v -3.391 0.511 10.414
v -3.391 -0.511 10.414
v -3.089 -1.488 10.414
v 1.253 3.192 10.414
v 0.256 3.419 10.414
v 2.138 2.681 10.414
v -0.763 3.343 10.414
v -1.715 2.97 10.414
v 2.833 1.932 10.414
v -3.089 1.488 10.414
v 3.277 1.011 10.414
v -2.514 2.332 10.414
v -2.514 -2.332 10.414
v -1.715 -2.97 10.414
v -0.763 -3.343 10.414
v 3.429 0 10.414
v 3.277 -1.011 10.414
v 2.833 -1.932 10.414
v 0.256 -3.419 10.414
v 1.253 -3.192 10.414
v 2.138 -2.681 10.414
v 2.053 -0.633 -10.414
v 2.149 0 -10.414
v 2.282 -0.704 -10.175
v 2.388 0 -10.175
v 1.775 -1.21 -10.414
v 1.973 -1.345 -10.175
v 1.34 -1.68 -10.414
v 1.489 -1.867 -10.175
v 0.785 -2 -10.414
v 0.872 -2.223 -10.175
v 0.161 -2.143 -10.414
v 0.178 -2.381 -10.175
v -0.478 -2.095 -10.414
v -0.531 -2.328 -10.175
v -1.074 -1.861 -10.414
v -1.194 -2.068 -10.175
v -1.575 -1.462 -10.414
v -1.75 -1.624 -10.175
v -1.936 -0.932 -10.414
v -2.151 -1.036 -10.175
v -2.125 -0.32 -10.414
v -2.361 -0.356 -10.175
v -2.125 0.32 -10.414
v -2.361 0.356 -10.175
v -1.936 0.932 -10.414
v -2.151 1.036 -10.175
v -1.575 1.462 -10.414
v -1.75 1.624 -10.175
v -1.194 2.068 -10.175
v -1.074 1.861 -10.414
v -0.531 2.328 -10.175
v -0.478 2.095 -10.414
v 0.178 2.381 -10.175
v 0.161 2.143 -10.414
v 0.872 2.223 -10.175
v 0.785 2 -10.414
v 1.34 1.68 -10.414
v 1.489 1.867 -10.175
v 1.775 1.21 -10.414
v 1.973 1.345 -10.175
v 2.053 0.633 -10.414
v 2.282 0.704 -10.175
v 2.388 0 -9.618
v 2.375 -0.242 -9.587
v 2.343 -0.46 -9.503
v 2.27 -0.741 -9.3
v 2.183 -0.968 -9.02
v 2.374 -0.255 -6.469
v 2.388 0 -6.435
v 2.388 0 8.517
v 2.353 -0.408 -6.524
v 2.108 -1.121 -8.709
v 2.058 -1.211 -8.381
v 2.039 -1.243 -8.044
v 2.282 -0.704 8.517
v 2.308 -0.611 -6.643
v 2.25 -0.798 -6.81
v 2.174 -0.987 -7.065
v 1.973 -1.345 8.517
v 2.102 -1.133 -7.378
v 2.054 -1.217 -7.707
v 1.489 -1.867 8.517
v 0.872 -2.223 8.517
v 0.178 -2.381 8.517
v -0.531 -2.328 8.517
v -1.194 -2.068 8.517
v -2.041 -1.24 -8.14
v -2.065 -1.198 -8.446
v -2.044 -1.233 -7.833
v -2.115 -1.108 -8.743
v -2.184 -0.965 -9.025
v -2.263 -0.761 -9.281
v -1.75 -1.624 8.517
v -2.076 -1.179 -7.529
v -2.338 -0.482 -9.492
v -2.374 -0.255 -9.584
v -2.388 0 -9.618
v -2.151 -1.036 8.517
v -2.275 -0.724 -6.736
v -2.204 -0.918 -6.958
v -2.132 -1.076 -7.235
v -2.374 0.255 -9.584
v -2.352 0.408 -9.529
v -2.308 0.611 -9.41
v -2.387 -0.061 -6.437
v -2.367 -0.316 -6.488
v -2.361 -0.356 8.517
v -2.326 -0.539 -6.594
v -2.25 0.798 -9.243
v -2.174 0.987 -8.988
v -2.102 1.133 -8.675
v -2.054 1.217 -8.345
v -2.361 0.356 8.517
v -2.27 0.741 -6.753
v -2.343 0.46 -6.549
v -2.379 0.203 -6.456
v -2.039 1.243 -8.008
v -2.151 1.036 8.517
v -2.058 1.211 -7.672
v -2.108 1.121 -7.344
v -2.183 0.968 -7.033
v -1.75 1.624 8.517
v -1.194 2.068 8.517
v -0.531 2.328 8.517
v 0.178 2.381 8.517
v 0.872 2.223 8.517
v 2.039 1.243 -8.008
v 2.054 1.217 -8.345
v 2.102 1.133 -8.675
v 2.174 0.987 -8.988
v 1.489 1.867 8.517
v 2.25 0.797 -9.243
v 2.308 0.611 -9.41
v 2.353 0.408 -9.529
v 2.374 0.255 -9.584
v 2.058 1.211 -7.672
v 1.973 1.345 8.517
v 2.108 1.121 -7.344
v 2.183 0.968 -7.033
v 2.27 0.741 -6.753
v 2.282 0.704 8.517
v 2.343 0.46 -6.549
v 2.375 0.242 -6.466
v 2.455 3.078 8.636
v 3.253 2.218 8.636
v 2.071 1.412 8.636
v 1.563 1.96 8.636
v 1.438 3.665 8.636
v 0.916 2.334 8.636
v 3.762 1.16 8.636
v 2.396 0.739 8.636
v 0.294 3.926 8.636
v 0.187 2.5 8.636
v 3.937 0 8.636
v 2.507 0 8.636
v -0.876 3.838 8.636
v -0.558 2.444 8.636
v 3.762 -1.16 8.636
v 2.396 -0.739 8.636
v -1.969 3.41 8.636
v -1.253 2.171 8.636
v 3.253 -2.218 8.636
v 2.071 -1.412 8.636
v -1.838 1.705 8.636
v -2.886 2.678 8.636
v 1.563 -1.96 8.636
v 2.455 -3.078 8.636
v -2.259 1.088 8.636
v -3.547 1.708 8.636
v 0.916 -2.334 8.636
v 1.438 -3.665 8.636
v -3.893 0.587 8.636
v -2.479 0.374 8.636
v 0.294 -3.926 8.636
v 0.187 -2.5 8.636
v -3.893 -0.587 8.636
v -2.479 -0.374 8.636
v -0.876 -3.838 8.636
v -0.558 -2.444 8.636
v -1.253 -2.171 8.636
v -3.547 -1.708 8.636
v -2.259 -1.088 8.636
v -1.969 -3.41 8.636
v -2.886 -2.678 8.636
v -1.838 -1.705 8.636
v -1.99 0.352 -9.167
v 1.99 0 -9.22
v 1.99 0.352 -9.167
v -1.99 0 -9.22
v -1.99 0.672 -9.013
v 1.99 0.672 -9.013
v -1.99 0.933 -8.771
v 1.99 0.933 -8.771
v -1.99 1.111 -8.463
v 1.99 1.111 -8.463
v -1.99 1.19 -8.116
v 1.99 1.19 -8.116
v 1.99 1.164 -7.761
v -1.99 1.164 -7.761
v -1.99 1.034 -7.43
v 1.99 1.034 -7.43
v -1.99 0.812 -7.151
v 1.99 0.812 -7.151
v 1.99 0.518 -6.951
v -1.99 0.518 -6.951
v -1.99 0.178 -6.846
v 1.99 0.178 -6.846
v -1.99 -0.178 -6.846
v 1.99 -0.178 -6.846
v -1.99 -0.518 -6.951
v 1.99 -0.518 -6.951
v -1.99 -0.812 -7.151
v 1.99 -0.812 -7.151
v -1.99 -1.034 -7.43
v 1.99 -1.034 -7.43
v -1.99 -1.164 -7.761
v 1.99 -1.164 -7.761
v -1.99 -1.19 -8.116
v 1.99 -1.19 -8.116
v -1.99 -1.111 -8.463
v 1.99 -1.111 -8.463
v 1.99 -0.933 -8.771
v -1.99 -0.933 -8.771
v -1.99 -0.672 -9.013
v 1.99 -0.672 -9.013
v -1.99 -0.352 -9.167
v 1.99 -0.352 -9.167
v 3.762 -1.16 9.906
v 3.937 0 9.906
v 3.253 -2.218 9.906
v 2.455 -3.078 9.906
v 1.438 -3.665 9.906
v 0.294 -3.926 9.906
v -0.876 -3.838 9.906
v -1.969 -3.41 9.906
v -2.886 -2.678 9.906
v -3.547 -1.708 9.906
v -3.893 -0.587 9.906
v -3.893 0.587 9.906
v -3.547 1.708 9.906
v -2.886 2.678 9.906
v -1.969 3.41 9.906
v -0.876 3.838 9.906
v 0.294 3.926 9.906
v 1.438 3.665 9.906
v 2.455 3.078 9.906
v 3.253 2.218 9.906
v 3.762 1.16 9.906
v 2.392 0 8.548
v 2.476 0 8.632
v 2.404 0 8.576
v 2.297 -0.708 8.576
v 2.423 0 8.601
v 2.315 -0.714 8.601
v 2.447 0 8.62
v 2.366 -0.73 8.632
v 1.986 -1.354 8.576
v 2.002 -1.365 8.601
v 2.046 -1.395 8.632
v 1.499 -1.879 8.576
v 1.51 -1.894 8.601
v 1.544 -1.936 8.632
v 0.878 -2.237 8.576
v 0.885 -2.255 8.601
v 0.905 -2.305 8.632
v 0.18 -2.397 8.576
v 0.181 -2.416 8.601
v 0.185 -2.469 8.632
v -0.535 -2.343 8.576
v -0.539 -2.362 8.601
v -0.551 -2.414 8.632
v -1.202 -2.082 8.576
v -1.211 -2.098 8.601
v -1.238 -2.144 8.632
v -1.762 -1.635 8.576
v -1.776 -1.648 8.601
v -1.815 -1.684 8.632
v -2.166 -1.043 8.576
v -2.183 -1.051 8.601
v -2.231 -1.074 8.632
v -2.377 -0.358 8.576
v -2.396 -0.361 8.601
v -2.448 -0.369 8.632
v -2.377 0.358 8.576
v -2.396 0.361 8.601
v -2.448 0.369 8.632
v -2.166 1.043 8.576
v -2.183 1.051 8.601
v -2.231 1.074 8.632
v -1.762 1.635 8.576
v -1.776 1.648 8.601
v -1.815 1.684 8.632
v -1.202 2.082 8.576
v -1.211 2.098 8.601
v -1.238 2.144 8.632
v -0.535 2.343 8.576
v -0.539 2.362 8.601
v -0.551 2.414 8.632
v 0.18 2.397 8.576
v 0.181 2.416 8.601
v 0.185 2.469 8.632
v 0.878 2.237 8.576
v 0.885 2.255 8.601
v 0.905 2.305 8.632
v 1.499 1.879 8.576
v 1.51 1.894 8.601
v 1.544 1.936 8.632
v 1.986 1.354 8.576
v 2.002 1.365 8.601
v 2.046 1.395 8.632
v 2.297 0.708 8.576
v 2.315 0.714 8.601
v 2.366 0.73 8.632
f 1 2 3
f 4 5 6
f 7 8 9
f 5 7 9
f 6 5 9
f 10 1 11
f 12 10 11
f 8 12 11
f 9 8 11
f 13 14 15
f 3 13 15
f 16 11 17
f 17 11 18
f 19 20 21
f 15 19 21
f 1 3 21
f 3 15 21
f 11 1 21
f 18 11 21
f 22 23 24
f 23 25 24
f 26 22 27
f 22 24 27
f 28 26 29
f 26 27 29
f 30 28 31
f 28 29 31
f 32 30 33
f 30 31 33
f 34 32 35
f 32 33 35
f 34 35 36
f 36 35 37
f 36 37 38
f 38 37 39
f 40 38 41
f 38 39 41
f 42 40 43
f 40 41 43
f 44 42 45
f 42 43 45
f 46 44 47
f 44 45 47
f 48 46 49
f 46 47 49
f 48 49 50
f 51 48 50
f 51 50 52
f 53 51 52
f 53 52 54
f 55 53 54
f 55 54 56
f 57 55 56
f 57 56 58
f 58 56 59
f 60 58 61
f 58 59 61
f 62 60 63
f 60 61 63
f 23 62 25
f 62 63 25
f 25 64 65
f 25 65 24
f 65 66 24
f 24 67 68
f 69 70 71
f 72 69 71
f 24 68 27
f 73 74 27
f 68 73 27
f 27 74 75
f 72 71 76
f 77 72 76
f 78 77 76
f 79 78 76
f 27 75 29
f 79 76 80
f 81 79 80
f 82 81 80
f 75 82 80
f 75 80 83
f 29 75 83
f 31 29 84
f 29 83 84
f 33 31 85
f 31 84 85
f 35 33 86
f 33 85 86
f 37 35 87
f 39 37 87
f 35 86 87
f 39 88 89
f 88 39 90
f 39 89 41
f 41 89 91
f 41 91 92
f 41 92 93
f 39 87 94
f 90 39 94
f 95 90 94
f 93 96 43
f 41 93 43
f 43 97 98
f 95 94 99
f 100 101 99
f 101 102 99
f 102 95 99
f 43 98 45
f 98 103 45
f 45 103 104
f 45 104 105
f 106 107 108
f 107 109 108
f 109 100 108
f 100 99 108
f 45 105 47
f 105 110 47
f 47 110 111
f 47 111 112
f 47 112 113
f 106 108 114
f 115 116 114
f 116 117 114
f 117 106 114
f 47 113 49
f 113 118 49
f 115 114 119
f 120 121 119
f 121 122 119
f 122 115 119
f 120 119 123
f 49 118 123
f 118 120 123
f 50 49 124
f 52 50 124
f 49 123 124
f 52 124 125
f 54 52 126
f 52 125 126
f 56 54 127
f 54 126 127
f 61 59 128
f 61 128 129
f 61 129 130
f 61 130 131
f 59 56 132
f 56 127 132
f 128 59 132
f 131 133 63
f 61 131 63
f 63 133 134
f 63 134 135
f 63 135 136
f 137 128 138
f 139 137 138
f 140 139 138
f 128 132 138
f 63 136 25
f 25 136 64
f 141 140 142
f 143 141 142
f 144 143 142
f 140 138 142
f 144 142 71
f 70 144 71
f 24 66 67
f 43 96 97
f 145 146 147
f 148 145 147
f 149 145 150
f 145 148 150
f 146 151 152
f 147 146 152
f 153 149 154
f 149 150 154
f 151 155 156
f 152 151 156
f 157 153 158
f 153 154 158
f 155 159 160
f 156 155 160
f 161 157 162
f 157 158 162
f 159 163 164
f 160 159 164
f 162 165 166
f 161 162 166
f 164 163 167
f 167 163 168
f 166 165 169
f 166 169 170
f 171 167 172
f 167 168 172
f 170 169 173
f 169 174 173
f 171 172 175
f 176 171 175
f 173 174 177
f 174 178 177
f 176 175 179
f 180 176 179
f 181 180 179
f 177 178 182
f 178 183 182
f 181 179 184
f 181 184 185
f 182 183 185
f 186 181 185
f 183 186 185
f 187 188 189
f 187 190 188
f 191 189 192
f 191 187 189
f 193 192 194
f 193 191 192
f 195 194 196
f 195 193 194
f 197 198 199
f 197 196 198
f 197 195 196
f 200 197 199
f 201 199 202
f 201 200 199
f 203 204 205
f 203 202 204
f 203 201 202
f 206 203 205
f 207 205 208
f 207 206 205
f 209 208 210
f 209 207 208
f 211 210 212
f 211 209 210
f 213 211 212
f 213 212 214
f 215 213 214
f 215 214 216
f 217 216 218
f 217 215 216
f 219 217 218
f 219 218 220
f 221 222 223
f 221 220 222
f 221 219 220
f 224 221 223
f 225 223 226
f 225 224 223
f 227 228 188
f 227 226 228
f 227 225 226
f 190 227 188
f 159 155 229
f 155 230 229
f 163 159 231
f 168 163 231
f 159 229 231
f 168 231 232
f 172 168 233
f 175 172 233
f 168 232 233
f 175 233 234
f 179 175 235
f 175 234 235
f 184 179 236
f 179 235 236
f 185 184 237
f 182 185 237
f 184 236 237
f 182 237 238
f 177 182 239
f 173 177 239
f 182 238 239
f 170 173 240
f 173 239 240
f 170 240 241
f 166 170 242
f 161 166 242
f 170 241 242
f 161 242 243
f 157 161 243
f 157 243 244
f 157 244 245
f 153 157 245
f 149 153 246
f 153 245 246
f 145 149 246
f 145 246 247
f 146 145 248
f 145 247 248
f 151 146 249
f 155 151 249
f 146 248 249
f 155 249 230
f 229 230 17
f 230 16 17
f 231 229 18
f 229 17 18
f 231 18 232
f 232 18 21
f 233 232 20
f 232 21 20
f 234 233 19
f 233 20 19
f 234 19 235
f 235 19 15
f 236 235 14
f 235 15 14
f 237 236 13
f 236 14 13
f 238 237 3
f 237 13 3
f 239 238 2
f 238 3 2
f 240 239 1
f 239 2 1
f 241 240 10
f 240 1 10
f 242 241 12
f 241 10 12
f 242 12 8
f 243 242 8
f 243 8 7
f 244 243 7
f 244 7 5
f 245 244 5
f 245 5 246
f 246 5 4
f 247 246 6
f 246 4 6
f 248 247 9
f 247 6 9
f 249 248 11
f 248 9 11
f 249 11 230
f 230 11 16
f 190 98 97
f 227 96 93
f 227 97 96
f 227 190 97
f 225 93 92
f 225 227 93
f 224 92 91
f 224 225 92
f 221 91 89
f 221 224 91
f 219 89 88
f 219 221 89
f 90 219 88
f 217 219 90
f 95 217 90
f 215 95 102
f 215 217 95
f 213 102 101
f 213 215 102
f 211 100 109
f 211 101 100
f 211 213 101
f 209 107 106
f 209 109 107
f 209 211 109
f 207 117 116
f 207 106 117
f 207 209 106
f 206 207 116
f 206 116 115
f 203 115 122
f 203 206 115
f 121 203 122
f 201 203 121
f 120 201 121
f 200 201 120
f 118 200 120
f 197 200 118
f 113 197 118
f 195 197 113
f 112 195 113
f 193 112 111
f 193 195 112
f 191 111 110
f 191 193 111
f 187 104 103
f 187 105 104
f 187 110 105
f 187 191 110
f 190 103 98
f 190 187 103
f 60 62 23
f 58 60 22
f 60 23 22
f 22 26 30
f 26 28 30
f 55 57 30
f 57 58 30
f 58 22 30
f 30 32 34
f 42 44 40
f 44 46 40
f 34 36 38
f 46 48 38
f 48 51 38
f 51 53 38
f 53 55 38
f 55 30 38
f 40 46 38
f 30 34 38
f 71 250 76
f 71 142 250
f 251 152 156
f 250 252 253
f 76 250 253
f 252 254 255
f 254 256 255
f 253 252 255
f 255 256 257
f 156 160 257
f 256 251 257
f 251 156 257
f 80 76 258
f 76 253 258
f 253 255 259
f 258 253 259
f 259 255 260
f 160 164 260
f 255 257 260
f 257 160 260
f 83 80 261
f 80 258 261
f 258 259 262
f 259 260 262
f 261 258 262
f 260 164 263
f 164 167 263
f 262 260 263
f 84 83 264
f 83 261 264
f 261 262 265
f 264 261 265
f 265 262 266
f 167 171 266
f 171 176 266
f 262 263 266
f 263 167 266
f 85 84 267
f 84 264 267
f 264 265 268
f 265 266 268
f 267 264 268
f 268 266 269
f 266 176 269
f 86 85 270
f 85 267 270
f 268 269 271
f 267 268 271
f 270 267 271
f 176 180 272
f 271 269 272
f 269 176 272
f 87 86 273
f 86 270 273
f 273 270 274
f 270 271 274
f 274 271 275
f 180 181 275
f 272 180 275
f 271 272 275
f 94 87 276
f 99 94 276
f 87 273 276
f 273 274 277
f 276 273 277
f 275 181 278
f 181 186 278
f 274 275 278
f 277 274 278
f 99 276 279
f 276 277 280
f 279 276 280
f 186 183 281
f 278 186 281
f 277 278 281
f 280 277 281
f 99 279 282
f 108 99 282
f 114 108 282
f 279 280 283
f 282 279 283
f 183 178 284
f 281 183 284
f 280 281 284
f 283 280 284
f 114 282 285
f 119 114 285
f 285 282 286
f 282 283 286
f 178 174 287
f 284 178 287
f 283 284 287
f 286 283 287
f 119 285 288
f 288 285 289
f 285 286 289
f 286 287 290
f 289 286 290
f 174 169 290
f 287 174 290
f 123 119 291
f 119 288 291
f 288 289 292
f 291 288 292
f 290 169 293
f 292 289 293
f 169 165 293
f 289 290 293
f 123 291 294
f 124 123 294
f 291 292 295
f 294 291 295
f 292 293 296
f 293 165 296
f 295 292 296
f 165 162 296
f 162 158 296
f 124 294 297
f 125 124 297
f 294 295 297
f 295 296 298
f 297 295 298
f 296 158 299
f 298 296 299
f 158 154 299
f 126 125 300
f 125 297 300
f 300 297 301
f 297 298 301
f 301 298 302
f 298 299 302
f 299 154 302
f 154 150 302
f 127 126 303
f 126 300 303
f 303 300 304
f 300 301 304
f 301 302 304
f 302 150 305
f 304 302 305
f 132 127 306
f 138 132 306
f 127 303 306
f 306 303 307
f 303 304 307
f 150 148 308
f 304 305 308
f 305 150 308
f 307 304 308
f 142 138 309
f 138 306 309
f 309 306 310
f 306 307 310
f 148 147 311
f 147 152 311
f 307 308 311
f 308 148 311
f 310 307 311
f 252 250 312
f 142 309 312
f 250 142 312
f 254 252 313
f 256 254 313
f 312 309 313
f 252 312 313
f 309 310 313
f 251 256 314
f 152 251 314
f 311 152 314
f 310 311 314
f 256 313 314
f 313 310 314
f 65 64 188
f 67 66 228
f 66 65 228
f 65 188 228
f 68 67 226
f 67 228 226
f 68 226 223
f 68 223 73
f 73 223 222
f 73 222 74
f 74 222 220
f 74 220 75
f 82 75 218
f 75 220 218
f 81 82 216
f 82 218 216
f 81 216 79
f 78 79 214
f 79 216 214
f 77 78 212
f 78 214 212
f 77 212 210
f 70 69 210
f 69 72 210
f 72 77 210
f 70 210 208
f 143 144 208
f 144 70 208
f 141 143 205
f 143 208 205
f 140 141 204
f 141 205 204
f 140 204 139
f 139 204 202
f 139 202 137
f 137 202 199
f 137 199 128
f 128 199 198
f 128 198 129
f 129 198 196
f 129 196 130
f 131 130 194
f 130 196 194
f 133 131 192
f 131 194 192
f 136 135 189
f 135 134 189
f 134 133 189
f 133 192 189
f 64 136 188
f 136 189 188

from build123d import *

# Parameters (mm, degrees)
CUT_EXTRUDE1_DEPTH      = 12.808951435
CUT_EXTRUDE1_DEPTH_BACK = 12.808951435
SKETCH3_R               = 1.1938


with BuildPart() as part:
    # Sketch2 → Revolve1 (revolve)
    with BuildSketch(Plane(origin=(0, 0, 0), x_dir=(0, 0, -1), z_dir=(1, 0, 0)), mode=Mode.PRIVATE) as revolve1_sk:
        with BuildLine():
            Line((10.17524, 2.3876), (-8.51662, 2.3876))
            ThreePointArc((-8.51662, 2.3876), (-8.601034408, 2.422565592), (-8.636, 2.50698))
            Line((-8.636, 2.50698), (-8.636, 3.937))
            Line((-8.636, 3.937), (-9.906, 3.937))
            Line((-9.906, 3.937), (-10.414, 3.429))
            Line((-10.414, 3.429), (-10.414, 0))
            Line((-10.414, 0), (10.414, 0))
            Line((10.414, 0), (10.414, 2.14884))
            Line((10.414, 2.14884), (10.17524, 2.3876))
        make_face()
    revolve(revolve1_sk.sketch.rotate(Axis((0, 0, 10.414), (0, 0, -1)), 90), axis=Axis((0, 0, 10.414), (0, 0, -1)))

    # Sketch3 → Cut-Extrude1 (cut, two sides: drawn at the far end of the back side and taken through both)
    with BuildSketch(Plane(origin=(0, 0, 0), x_dir=(0, 0, -1), z_dir=(1, 0, 0)).offset(-CUT_EXTRUDE1_DEPTH_BACK)):
        with Locations((8.0264, 0)):
            Circle(SKETCH3_R)
    extrude(amount=CUT_EXTRUDE1_DEPTH + CUT_EXTRUDE1_DEPTH_BACK, mode=Mode.SUBTRACT)

    # Sketch4 → Cut-Revolve1 (revolve, cut)
    with BuildSketch(Plane(origin=(0, 0, 0), x_dir=(1, 0, 0), z_dir=(0, 1, 0)), mode=Mode.PRIVATE) as cut_revolve1_sk:
        Polygon((2.3876, 6.434666667), (0.795866667, 8.0264), (2.3876, 8.0264), align=None)
        Polygon((-2.3876, 8.0264), (-2.3876, 6.434666667), (-0.795866667, 8.0264), align=None)
    revolve(cut_revolve1_sk.sketch.rotate(Axis((2.3876, 0, -8.0264), (-1, 0, 0)), 180), axis=Axis((2.3876, 0, -8.0264), (-1, 0, 0)), mode=Mode.SUBTRACT)


solid = part.part
